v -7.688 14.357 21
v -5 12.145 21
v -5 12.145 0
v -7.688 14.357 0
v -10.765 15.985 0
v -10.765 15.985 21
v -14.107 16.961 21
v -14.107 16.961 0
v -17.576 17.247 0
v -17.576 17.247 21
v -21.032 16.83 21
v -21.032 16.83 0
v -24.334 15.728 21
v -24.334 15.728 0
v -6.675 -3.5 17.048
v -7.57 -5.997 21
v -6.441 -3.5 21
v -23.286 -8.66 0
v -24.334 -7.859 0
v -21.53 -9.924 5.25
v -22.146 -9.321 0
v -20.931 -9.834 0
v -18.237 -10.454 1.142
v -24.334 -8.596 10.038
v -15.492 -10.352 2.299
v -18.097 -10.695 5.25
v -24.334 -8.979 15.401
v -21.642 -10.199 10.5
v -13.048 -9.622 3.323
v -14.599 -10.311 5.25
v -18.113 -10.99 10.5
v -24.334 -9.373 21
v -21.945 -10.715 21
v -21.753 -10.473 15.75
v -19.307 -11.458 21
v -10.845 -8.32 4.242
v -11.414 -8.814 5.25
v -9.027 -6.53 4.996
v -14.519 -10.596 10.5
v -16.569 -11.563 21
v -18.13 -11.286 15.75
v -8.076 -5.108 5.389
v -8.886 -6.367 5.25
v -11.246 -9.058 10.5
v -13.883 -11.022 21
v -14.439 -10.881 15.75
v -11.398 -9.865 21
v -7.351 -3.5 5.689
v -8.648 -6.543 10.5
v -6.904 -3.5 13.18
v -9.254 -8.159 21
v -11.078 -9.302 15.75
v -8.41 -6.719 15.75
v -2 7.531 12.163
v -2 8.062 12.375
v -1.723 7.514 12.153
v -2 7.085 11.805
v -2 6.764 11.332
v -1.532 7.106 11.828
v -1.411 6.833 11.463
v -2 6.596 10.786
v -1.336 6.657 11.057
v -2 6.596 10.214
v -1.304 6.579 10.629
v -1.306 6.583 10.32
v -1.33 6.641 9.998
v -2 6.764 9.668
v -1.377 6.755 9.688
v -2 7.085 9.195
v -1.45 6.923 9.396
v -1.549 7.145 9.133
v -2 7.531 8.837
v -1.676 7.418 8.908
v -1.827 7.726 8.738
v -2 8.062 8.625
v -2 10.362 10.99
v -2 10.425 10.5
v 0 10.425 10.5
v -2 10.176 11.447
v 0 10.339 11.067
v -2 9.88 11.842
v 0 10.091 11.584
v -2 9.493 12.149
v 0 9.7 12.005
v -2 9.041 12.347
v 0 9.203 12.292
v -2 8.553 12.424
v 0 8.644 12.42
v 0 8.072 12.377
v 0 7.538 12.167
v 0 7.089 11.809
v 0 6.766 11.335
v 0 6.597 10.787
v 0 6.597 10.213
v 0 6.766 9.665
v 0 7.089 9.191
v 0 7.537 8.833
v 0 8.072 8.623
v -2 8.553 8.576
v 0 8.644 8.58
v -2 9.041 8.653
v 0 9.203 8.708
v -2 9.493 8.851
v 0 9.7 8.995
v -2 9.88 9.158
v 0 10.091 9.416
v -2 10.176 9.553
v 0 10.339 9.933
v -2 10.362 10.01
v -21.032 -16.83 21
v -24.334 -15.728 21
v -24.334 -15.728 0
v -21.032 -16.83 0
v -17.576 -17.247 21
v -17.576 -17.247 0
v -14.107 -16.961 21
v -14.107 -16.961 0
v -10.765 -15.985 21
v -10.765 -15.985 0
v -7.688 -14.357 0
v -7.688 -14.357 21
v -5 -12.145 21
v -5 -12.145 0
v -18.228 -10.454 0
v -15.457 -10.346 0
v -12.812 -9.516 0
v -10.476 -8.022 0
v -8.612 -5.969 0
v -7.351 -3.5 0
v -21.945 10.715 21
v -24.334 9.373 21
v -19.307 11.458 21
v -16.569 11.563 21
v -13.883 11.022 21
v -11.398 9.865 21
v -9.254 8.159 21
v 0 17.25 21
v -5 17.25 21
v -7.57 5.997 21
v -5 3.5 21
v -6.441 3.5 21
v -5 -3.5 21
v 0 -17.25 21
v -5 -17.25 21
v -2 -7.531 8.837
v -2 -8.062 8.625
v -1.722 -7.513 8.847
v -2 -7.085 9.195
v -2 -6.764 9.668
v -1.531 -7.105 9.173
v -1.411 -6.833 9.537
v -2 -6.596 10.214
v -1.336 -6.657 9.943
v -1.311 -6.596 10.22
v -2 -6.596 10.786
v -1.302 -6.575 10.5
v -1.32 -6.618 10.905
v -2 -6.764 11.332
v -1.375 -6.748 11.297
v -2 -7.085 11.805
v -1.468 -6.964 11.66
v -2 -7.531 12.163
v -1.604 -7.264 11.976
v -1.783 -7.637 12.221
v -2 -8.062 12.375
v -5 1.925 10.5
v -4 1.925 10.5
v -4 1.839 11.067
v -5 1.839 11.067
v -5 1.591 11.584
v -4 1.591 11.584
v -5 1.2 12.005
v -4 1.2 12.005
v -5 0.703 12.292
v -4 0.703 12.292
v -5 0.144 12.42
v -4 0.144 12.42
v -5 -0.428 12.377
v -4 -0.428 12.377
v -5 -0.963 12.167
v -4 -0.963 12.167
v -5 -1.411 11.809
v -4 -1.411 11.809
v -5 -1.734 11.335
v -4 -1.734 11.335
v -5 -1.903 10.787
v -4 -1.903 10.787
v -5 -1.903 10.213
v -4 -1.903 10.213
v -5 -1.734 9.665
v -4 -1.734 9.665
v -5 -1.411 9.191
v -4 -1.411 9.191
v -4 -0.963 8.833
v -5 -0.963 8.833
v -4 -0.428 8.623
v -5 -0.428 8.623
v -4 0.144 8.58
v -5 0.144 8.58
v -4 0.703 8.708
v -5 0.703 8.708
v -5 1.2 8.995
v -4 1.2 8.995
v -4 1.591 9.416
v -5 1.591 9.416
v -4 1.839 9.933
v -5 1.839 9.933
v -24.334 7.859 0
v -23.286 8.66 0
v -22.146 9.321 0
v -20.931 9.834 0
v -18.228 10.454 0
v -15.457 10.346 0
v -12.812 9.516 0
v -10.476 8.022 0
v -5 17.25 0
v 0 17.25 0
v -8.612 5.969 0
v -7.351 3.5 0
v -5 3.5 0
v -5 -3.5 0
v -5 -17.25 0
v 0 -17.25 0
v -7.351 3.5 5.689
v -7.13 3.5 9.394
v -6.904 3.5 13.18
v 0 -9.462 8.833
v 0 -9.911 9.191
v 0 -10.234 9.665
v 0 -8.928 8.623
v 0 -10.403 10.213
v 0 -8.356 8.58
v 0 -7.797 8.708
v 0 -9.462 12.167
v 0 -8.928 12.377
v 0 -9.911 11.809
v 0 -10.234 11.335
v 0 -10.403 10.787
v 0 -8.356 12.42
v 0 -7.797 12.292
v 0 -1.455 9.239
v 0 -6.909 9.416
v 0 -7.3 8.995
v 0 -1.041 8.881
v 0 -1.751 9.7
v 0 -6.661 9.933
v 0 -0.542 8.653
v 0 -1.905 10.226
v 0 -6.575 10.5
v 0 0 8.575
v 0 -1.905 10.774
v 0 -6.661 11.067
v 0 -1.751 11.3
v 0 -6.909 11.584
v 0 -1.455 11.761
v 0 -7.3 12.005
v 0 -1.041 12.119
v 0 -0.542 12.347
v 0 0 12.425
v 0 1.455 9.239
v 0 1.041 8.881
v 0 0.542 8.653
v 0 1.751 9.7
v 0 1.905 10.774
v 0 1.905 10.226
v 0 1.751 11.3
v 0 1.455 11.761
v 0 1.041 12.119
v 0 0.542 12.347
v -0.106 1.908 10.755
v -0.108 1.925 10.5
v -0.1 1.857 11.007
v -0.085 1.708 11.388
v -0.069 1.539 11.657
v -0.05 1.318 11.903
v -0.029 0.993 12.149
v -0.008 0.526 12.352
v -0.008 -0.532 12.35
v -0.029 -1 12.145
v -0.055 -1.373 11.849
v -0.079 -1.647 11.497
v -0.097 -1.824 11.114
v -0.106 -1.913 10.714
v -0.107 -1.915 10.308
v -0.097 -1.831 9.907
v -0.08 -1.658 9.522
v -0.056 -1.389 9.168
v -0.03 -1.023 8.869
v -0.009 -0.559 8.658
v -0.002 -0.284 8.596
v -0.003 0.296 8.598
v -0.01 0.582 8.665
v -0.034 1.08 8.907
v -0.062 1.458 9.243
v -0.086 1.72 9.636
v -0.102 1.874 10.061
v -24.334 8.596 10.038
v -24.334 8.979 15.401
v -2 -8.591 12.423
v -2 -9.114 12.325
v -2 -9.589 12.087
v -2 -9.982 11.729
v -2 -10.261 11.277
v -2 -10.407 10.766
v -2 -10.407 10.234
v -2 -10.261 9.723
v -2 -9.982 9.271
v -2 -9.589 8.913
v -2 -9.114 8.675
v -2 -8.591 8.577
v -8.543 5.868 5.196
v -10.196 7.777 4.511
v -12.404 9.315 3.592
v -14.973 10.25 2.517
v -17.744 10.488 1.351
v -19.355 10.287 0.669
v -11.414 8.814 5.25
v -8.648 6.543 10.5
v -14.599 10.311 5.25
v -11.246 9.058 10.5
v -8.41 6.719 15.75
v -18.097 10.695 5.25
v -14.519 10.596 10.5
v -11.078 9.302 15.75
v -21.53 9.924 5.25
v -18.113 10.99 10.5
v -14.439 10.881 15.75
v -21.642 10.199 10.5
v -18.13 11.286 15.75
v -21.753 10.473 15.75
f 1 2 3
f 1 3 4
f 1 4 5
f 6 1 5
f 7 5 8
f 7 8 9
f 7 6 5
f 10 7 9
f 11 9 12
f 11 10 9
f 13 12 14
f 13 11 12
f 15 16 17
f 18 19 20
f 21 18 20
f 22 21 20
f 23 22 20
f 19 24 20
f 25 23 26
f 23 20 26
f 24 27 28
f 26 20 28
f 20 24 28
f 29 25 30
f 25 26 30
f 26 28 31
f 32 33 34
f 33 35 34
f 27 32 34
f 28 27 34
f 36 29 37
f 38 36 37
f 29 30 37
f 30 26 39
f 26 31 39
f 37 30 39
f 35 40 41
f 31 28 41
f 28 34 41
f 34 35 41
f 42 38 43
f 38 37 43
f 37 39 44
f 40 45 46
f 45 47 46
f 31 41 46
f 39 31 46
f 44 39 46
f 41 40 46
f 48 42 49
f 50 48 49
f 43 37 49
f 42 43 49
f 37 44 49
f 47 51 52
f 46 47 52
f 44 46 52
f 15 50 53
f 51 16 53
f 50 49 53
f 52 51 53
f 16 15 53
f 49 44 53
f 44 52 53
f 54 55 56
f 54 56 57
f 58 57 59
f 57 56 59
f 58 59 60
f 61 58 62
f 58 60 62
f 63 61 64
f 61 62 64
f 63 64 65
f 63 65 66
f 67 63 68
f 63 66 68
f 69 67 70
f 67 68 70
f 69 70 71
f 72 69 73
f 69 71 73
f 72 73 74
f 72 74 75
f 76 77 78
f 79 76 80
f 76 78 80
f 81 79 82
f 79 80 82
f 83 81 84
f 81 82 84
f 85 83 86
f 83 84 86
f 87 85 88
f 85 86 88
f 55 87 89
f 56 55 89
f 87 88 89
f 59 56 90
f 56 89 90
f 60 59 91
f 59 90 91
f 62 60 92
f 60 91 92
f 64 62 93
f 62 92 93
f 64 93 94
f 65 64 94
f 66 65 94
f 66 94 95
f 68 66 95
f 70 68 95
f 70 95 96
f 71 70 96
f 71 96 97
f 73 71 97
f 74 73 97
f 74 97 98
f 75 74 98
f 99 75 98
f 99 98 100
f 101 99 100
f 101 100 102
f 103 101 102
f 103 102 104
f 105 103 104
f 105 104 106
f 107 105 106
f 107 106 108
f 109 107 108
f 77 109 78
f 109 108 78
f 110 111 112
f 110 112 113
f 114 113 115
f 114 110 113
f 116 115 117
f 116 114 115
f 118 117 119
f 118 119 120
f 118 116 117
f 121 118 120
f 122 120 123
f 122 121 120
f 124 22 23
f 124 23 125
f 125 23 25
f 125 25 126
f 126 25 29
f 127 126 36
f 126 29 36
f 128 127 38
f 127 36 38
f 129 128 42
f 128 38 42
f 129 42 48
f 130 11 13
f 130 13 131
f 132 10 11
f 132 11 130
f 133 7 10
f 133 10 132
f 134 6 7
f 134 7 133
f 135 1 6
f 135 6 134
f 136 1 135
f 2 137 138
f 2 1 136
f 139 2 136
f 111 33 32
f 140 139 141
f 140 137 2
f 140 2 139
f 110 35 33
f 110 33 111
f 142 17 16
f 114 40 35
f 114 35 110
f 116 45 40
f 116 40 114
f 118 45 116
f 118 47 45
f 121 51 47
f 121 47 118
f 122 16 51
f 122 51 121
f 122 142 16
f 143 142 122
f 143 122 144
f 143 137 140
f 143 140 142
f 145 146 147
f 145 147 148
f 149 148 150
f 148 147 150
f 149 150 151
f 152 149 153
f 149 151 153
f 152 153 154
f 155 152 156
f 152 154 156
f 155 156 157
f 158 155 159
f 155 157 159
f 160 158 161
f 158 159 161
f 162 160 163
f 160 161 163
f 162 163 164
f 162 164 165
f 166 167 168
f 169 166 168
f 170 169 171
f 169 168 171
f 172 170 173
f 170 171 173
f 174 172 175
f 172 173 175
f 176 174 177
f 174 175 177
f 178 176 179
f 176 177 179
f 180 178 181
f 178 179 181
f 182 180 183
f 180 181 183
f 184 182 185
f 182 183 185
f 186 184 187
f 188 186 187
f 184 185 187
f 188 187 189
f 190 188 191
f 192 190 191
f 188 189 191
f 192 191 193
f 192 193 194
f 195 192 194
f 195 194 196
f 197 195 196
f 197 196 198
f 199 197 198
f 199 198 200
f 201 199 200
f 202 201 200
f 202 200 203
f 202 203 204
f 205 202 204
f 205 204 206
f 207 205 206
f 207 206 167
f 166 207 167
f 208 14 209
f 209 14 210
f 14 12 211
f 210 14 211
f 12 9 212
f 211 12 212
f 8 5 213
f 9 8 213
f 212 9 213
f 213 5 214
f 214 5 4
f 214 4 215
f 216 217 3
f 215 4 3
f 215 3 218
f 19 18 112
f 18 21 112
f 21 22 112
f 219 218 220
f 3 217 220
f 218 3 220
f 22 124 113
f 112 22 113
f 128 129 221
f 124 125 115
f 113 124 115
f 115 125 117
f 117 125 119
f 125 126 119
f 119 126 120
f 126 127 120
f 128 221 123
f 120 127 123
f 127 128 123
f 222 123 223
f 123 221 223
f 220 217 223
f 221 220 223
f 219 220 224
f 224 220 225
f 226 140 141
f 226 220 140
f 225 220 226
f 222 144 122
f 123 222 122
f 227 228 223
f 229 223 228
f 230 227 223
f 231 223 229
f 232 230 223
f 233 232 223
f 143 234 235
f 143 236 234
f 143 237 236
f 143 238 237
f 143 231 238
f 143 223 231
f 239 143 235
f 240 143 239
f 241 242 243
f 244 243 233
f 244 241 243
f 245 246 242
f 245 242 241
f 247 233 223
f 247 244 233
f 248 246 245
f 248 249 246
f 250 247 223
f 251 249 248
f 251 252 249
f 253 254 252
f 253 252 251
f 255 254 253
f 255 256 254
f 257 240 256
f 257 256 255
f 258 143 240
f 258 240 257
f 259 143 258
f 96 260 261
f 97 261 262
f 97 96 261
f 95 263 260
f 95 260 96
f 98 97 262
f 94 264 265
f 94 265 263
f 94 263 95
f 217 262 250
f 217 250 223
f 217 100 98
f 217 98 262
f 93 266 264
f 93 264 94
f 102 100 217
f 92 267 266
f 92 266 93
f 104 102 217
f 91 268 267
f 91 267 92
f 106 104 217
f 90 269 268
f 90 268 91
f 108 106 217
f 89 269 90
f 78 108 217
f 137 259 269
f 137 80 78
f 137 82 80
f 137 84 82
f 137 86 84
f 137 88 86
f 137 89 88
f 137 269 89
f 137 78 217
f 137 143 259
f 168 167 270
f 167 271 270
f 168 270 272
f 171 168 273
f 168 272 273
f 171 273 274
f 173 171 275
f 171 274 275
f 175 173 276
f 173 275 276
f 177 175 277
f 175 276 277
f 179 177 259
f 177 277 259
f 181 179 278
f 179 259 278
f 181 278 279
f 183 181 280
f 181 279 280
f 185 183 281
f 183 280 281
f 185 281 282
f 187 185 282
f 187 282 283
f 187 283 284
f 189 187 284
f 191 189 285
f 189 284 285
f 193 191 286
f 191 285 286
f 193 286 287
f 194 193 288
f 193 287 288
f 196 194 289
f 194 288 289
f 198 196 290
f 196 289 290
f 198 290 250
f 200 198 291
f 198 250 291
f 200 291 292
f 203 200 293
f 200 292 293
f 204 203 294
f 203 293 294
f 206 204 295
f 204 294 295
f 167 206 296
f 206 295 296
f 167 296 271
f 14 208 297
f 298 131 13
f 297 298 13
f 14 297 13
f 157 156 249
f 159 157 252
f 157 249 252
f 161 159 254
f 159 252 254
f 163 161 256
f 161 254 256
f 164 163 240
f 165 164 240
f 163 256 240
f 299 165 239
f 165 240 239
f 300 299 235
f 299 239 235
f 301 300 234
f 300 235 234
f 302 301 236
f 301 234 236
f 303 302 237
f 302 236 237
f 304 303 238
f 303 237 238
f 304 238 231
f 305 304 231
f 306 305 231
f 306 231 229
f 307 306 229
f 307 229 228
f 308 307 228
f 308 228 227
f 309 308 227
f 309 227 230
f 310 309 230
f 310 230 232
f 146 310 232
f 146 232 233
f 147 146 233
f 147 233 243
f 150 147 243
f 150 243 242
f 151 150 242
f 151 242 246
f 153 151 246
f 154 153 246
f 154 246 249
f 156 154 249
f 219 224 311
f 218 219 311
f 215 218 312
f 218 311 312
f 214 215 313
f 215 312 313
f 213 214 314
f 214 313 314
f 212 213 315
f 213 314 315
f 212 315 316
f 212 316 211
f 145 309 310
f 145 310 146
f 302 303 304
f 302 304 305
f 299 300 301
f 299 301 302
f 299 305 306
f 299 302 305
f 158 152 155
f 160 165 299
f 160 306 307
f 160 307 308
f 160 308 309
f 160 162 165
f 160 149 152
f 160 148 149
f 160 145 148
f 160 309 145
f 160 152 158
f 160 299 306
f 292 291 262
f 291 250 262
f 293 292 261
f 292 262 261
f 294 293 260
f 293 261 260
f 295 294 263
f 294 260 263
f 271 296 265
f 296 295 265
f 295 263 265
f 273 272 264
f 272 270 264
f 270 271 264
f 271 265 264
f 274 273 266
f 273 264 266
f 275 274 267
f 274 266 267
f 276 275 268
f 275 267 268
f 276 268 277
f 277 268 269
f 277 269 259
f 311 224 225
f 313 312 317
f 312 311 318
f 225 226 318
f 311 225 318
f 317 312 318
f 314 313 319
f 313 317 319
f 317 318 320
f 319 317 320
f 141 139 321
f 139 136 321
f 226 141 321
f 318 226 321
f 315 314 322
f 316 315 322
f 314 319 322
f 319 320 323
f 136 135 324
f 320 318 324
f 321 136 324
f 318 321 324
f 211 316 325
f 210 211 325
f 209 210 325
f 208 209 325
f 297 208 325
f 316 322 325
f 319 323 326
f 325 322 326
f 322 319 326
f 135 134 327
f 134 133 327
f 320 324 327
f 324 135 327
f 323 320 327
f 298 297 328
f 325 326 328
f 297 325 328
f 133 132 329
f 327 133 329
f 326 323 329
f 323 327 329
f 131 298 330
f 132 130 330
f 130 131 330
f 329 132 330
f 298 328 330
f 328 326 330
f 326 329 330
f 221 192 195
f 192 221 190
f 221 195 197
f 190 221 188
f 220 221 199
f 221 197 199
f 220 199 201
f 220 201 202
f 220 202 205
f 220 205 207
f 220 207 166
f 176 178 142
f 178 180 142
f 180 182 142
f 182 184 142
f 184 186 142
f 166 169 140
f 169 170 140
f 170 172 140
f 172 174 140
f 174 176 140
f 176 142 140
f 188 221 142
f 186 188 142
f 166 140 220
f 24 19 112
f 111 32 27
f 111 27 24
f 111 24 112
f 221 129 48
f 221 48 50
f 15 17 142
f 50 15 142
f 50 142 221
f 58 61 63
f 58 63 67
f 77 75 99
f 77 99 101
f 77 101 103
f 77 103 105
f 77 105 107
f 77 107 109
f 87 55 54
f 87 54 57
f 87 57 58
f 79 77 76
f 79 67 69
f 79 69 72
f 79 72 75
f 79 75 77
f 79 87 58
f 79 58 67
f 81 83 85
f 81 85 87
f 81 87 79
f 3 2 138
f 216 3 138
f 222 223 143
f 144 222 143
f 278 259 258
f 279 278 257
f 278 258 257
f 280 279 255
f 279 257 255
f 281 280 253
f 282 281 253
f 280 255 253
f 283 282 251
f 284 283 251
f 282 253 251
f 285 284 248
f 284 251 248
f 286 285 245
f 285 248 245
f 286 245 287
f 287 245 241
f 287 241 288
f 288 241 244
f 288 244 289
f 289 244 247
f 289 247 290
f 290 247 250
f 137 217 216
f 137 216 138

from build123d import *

# Parameters (mm, degrees)
SKETCH007_W     = 34.5
SKETCH007_H     = 21
SKETCH007_R     = 1.925
PAD001_DEPTH    = 5
SKETCH008_R     = 1.925
POCKET006_DEPTH = 2
PAD002_DEPTH    = 21
SKETCH010_R     = 1.925
POCKET007_DEPTH = 2
SKETCH011_R     = 1.925
POCKET008_DEPTH = 24.335471


with BuildPart() as cono:
    # Cone → Cone (revolve)
    with BuildSketch(Plane(origin=(-17.5, 0, 0), x_dir=(1, 0, 0), z_dir=(0, -1, 0))):
        Polygon((0, 0), (10.415, 0), (11.6, 21), (0, 21), align=None)
    revolve(axis=Axis((-17.5, 0, 0), (0, 0, 1)))


with BuildPart() as soporte_ducha_telefono_cono:
    # Sketch007 → Pad001 (new body)
    with BuildSketch(Plane.YZ):
        with Locations((0, 10.5)):
            Rectangle(SKETCH007_W, SKETCH007_H)
        with Locations((0, 10.5)):
            Circle(SKETCH007_R, mode=Mode.SUBTRACT)
    extrude(amount=-PAD001_DEPTH)

    # Sketch008 → Pocket006 (cut)
    with BuildSketch(Plane.YZ):
        with Locations((-8.5, 10.5)):
            Circle(SKETCH008_R)
        with Locations((8.5, 10.5)):
            Circle(SKETCH008_R)
    extrude(amount=-POCKET006_DEPTH, mode=Mode.SUBTRACT)

    # Sketch009 → Pad002 (new body)
    with BuildSketch(Plane(origin=(0, 0, 21), x_dir=(0, -1, 0), z_dir=(0, 0, 1))):
        with BuildLine():
            ThreePointArc((15.728159, -24.334314), (-8.6e-05, 0), (-15.728089, -24.334471))
            Line((-7.75, -24.334314), (-15.728089, -24.334471))
            ThreePointArc((-3.5, -7.350505), (-10.185925, -14.701091), (-7.75, -24.334314))
            Line((-3.5, -4), (-3.5, -7.350505))
            Line((3.5, -4), (-3.5, -4))
            Line((3.5, -7.350505), (3.5, -4))
            ThreePointArc((7.75, -24.334314), (10.185925, -14.701091), (3.5, -7.350505))
            Line((7.75, -24.334314), (15.728159, -24.334314))
        make_face()
    extrude(amount=-PAD002_DEPTH)

    # Sketch010 → Pocket007 (cut)
    with BuildSketch(Plane.YZ):
        with Locations((-8.5, 10.5)):
            Circle(SKETCH010_R)
        with Locations((8.5, 10.5)):
            Circle(SKETCH010_R)
    extrude(amount=-POCKET007_DEPTH, mode=Mode.SUBTRACT)

    # Sketch011 → Pocket008 (cut, through all)
    with BuildSketch(Plane.YZ):
        with Locations((0, 10.5)):
            Circle(SKETCH011_R)
    extrude(amount=-POCKET008_DEPTH, mode=Mode.SUBTRACT)

    # Cut: cut Cono
    add(cono.part, mode=Mode.SUBTRACT)


solid = soporte_ducha_telefono_cono.part
